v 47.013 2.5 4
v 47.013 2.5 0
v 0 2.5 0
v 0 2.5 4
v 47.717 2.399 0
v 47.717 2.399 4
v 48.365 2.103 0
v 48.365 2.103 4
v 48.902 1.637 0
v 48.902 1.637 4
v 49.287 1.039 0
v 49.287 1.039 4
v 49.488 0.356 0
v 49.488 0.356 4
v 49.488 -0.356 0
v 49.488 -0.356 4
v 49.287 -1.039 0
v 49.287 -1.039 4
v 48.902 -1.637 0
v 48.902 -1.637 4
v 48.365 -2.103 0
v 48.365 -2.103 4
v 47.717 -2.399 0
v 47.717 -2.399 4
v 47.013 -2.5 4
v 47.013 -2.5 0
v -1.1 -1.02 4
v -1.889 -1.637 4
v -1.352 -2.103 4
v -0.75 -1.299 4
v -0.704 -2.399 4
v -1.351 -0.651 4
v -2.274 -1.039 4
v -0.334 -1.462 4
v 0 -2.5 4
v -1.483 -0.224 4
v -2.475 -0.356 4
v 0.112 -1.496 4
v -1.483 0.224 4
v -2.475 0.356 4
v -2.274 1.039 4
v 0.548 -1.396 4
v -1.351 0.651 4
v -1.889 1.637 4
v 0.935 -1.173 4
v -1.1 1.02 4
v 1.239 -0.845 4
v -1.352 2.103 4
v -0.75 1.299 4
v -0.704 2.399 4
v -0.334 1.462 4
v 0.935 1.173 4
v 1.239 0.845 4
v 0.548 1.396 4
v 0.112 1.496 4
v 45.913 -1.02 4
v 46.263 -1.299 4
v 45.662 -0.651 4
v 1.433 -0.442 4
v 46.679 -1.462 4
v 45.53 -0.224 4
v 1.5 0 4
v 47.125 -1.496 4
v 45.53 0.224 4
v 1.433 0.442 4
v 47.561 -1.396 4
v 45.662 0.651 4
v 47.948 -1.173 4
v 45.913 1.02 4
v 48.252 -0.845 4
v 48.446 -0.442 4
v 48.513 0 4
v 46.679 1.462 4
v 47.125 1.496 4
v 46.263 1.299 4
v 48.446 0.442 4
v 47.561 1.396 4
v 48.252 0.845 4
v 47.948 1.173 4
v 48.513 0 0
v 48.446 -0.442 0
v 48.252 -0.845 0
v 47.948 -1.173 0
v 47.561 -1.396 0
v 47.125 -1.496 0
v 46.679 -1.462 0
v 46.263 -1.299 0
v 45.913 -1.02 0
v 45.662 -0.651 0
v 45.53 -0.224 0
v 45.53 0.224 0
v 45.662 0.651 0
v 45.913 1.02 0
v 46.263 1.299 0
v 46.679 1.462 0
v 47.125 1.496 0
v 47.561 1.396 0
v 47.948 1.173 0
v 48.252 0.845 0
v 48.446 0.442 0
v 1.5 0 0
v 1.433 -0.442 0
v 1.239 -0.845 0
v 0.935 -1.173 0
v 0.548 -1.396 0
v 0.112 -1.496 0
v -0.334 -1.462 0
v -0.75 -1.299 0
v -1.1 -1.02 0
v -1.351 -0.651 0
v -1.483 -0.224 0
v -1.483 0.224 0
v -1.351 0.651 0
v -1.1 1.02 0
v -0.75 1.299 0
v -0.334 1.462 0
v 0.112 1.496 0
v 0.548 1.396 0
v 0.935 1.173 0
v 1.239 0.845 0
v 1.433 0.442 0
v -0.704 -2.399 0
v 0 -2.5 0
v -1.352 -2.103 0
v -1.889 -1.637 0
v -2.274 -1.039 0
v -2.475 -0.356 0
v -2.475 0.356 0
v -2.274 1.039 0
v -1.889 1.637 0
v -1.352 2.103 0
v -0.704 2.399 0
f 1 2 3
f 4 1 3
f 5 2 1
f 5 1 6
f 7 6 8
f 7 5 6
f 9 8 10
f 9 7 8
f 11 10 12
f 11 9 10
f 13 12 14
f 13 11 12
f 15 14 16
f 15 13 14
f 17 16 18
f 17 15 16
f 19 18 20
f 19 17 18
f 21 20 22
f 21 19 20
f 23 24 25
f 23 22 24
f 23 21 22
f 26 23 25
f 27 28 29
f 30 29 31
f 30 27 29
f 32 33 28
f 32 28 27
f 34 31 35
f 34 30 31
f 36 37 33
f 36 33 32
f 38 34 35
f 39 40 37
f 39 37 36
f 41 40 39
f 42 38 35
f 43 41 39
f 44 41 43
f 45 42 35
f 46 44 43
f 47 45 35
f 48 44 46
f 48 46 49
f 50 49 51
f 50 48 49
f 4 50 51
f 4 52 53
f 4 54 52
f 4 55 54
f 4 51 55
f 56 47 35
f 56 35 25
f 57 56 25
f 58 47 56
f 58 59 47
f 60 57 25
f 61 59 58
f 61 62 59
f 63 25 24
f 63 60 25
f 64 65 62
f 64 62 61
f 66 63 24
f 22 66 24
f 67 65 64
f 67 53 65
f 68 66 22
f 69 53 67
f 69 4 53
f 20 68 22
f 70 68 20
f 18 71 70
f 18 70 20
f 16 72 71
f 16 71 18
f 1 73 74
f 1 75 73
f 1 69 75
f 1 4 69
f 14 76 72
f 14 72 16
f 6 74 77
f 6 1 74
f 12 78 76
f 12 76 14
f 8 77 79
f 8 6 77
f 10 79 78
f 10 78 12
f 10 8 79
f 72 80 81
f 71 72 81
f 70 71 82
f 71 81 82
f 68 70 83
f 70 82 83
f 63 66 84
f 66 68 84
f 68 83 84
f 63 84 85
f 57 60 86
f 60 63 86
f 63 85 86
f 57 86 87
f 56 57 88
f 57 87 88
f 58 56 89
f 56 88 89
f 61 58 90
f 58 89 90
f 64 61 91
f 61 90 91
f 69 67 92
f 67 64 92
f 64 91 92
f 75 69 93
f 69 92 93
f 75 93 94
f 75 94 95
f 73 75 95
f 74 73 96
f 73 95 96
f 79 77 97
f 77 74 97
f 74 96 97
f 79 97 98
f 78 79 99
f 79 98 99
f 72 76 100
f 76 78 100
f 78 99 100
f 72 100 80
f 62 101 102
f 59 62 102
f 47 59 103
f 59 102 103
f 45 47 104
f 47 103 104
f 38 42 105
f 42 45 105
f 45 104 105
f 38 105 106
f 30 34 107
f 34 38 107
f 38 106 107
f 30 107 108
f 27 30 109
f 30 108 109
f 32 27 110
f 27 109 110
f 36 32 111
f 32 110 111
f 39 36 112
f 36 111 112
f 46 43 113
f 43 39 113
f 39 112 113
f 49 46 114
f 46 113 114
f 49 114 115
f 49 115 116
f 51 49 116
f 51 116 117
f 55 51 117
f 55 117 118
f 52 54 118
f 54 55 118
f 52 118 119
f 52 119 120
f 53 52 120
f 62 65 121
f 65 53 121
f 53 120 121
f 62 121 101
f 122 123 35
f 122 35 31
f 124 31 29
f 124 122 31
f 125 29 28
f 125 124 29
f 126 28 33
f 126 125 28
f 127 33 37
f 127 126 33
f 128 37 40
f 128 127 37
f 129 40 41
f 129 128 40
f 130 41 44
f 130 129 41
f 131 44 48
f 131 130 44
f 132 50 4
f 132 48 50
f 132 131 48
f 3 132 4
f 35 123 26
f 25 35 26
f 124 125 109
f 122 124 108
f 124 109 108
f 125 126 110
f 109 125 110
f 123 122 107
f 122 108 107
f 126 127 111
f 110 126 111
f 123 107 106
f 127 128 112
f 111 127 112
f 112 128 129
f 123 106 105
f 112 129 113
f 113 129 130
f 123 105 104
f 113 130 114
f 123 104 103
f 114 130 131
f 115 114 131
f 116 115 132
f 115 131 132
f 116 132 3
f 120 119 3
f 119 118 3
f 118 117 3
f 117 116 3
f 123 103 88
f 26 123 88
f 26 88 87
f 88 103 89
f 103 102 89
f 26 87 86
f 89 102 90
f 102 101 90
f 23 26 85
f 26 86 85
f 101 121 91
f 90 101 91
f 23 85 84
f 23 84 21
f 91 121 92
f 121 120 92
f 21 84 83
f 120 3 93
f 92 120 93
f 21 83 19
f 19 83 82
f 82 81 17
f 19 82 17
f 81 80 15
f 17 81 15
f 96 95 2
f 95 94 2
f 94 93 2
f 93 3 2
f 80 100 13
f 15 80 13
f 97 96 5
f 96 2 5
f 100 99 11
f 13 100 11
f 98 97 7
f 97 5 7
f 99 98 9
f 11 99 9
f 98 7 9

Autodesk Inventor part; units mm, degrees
ref_plane "YZ Plane" through (0, 0, 0) normal (1, 0, 0) x (0, 1, 0)
ref_plane "XZ Plane" through (0, 0, 0) normal (0, 1, 0) x (-1, 0, 0)
ref_plane "XY Plane" through (0, 0, 0) normal (0, 0, 1) x (1, 0, 0)
sketch "스케치1" plane through (0, 0, 0) normal (0, 0, 1) x (1, 0, 0)
  line L0 (0, 0) -> (47.013, 0) construction
  line L1 (0, -2.5) -> (47.013, -2.5)
  line L2 (47.013, 2.5) -> (0, 2.5)
  arc A0 (0, 2.5) -> (0, -2.5) centre (0, 0) ccw
  arc A1 (47.013, -2.5) -> (47.013, 2.5) centre (47.013, 0) ccw
  circle A2 centre (0, 0) radius 1.5
  circle A3 centre (47.013, 0) radius 1.5
  point P0 (23.5065, 0)
  point P1 (49.513, 0)
  point P2 (-2.5, 0)
  dimension "d0" = 5
  dimension "d4" = 3
  dimension "d5" = 3
  dimension "d6" = 47.013
extrude "돌출1" add sketch "스케치1" along normal blind 4
properties part number "SteeringAxis"
